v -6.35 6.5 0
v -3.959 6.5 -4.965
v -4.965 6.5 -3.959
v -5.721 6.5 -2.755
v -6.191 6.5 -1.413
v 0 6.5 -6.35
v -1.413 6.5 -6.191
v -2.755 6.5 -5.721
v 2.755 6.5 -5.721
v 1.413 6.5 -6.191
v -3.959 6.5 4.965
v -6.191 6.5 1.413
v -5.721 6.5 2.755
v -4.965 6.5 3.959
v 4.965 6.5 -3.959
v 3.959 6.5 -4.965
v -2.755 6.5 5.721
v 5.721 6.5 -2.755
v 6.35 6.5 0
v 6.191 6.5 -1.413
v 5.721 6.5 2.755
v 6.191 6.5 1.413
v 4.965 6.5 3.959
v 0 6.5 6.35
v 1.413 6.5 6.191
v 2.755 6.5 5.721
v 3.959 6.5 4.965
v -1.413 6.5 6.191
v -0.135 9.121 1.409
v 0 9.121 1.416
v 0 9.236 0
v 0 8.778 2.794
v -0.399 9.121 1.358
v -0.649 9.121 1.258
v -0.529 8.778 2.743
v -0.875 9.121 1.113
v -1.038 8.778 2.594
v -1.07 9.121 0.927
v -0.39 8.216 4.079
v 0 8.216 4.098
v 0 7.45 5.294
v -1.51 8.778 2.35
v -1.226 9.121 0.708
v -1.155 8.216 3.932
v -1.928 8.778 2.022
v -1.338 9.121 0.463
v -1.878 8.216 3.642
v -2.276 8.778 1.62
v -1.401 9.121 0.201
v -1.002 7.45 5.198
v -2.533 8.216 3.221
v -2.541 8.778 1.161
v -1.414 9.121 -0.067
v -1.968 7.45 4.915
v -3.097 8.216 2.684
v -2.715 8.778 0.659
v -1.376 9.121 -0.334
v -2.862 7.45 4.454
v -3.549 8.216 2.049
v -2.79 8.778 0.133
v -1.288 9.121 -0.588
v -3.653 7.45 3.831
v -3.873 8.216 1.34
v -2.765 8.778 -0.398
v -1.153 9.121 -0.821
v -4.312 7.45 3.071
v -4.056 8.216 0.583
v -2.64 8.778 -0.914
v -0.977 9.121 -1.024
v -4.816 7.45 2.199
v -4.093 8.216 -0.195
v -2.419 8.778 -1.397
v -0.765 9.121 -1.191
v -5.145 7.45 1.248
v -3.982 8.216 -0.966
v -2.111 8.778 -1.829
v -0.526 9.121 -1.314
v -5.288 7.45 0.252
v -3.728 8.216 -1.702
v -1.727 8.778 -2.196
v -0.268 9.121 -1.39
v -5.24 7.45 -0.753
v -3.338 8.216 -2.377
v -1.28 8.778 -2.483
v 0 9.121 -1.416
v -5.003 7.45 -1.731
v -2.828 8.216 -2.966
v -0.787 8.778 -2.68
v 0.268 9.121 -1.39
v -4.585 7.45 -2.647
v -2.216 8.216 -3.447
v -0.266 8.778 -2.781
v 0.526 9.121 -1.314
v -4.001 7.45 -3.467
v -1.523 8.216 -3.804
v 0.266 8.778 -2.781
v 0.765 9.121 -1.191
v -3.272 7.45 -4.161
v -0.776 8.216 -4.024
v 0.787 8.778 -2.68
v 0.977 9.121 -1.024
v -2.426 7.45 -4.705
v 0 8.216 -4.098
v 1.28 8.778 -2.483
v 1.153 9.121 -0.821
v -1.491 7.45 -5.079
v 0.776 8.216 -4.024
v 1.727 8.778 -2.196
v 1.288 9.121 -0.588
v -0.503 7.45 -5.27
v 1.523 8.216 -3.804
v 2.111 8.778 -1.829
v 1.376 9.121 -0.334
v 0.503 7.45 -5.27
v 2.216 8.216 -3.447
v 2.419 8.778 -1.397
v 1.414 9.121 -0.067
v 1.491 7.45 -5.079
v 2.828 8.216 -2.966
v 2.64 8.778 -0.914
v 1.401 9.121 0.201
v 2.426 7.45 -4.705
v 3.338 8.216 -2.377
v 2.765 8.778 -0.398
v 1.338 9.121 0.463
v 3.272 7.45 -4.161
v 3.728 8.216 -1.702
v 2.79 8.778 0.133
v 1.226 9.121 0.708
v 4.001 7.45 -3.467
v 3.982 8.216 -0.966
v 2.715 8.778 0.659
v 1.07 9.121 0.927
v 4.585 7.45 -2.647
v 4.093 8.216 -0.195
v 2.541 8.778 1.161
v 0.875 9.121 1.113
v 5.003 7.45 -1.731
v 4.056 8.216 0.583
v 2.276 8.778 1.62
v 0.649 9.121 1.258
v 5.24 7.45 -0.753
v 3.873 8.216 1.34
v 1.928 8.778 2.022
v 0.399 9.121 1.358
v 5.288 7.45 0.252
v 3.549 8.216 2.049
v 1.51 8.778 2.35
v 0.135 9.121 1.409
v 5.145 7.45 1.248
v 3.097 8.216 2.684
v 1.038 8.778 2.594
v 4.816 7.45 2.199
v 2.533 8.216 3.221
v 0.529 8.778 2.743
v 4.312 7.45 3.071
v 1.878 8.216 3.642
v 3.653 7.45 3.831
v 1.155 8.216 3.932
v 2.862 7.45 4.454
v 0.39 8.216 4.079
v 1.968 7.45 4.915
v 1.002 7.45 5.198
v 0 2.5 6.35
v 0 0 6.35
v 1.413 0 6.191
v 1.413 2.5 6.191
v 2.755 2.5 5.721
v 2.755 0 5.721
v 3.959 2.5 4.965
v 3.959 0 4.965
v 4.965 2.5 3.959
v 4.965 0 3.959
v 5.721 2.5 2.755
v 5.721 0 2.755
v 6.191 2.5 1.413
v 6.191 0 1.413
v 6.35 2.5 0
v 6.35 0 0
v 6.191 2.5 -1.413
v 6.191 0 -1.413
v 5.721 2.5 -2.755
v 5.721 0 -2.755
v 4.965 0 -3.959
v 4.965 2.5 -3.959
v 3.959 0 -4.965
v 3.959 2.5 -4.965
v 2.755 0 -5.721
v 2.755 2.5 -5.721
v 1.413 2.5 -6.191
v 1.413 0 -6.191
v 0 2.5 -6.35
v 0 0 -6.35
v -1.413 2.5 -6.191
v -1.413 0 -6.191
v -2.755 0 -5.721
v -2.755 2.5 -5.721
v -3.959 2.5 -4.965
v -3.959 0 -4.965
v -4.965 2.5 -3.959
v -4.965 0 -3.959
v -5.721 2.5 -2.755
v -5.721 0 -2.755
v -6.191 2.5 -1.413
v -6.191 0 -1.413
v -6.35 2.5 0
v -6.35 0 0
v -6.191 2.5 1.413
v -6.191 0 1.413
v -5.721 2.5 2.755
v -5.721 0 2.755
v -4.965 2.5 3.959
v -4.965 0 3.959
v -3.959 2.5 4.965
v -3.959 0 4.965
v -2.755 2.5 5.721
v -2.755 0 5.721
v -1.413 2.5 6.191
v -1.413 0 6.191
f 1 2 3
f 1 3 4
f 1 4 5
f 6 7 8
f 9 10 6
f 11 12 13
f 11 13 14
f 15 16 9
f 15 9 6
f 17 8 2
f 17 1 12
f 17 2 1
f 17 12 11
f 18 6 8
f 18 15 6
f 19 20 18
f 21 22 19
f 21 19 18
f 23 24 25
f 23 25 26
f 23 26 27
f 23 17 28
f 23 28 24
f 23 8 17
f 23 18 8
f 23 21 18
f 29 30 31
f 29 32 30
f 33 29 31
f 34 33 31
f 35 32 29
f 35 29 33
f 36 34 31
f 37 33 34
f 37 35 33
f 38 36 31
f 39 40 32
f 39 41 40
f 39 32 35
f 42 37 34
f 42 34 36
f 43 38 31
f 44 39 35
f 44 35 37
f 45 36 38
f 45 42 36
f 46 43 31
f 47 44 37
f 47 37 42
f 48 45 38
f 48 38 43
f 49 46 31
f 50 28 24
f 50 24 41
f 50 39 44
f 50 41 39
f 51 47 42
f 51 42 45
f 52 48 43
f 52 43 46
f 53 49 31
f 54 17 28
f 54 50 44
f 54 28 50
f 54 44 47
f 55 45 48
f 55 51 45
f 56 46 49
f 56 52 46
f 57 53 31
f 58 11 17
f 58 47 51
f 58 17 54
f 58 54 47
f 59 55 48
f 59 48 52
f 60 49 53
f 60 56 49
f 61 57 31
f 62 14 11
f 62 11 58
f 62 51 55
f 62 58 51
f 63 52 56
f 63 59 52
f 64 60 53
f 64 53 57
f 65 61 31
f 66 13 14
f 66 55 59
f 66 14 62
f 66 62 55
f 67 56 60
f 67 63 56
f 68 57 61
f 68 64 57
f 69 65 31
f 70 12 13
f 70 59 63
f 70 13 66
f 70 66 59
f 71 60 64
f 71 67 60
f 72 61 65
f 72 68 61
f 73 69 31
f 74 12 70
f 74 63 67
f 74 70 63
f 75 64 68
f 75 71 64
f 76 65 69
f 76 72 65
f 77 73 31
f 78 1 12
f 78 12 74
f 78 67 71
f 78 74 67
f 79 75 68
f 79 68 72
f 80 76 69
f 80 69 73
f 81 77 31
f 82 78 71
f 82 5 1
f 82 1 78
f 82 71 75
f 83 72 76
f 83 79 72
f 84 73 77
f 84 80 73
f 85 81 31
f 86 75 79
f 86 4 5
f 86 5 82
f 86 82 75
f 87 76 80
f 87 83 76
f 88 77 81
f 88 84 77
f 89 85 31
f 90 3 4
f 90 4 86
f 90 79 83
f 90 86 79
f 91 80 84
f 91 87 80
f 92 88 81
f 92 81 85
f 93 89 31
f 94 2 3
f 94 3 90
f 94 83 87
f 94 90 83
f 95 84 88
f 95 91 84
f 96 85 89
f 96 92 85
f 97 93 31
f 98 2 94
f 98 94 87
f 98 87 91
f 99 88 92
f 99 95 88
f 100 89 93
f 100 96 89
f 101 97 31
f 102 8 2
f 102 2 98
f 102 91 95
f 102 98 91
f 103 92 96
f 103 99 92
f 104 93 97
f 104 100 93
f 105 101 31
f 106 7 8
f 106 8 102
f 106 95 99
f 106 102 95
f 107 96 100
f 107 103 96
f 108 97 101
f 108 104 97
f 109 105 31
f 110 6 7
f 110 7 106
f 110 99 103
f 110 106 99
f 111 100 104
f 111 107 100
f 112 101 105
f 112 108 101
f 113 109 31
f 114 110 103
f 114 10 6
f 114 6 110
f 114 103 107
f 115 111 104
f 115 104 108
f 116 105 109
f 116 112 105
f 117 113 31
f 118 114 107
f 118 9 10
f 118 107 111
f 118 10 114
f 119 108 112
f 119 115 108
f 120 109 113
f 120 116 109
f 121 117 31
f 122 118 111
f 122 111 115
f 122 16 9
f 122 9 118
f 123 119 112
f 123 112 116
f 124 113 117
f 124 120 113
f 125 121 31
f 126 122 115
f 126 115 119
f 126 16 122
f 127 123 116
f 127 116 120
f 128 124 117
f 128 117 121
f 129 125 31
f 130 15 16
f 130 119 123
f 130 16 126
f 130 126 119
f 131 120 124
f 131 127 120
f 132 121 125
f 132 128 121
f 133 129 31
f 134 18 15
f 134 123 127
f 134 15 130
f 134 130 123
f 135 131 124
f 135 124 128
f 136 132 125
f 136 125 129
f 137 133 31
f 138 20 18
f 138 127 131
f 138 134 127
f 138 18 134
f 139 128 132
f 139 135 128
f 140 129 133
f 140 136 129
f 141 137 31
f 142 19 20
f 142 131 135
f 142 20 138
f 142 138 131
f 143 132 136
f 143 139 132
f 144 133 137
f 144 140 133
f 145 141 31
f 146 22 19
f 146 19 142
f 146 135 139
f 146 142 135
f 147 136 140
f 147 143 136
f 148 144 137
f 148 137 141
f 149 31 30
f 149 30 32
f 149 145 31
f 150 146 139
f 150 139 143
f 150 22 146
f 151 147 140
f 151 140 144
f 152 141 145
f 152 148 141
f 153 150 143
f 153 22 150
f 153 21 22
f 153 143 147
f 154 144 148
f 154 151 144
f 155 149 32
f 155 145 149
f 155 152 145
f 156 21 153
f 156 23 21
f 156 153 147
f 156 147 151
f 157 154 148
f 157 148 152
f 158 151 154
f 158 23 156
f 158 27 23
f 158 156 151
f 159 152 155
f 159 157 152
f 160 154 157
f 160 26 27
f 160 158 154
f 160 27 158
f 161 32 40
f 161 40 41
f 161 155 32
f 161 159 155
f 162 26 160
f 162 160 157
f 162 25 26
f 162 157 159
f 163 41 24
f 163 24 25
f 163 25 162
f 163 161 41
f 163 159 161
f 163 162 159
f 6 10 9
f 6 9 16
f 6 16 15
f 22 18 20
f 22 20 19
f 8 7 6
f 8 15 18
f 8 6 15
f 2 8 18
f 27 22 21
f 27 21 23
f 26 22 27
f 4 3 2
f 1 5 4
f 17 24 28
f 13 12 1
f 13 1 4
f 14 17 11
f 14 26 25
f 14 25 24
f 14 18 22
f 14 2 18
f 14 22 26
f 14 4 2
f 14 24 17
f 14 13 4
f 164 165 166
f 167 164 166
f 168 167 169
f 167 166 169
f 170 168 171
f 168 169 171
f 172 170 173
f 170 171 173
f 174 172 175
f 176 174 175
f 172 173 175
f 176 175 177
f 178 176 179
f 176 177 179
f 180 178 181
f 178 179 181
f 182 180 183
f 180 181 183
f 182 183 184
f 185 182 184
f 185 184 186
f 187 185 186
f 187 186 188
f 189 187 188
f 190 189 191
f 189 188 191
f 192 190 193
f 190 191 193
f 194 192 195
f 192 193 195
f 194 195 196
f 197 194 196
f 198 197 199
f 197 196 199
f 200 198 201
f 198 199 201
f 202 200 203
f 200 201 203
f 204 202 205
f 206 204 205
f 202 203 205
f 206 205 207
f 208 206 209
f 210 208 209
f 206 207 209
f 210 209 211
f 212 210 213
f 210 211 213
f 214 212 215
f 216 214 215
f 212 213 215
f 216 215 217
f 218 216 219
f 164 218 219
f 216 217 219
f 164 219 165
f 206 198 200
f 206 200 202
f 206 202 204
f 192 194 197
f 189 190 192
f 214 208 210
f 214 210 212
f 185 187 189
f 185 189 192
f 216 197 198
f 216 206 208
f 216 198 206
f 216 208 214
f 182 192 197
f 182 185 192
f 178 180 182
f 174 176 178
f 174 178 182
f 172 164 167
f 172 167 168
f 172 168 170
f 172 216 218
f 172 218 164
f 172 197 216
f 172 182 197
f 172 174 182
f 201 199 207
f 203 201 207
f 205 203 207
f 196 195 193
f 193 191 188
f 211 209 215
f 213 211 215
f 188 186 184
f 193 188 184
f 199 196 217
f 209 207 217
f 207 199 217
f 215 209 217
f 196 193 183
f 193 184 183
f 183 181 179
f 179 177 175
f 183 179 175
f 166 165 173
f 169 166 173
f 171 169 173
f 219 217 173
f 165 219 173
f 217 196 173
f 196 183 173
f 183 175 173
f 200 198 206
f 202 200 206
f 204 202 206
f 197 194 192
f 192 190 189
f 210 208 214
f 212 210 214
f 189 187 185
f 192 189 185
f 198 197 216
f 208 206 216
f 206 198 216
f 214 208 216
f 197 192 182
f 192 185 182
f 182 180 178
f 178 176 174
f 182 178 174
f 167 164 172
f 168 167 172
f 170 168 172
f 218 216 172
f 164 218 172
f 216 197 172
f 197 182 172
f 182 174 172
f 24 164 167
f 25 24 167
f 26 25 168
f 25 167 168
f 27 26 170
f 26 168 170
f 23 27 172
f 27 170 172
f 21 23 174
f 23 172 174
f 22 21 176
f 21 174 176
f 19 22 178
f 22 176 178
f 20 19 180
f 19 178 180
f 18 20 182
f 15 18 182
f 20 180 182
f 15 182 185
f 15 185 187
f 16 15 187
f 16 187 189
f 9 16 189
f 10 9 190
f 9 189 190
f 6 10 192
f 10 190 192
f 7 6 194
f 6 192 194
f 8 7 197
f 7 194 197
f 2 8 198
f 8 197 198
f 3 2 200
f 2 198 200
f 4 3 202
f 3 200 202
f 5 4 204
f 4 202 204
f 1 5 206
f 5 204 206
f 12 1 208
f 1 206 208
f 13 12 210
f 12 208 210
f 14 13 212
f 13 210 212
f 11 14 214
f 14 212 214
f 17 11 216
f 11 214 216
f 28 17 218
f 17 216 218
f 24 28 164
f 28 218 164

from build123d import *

# Parameters (mm, degrees)
SKETCH1_R           = 6.35
BOSS_EXTRUDE1_DEPTH = 2.5
SKETCH2_R           = 6.35
BOSS_EXTRUDE2_DEPTH = 4


with BuildPart() as part:
    # Sketch1 → Boss-Extrude1 (new body)
    with BuildSketch(Plane(origin=(0, 0, 0), x_dir=(1, 0, 0), z_dir=(0, 1, 0))):
        with Locations(Location((0, 0, 0), (0, 0, 270))):  # turned: the seam where the file's is
            Circle(SKETCH1_R)
    extrude(amount=BOSS_EXTRUDE1_DEPTH)


with BuildPart() as body_2:
    # Sketch2 → Boss-Extrude2 (new body)
    with BuildSketch(Plane(origin=(0, 2.5, 0), x_dir=(1, 0, 0), z_dir=(0, 1, 0))):
        with Locations(Location((0, 0, 0), (0, 0, 270))):  # turned: the seam where the file's is
            Circle(SKETCH2_R)
    extrude(amount=BOSS_EXTRUDE2_DEPTH)


with BuildPart() as body_3:
    # Sketch3 → Revolve1 (revolve)
    with BuildSketch(Plane.XY, mode=Mode.PRIVATE) as revolve1_sk:
        with BuildLine():
            Line((6.35, 6.5), (0, 6.5))
            Line((0, 6.5), (0, 9.23627495))
            ThreePointArc((0, 9.23627495), (3.457227958, 8.523096338), (6.35, 6.5))
        make_face()
    revolve(revolve1_sk.sketch.rotate(Axis((0, 8.421453096, 0), (0, -1, 0)), 90), axis=Axis((0, 8.421453096, 0), (0, -1, 0)))  # turned: the seam where the file's is


solid = Compound([part.part, body_2.part, body_3.part])
